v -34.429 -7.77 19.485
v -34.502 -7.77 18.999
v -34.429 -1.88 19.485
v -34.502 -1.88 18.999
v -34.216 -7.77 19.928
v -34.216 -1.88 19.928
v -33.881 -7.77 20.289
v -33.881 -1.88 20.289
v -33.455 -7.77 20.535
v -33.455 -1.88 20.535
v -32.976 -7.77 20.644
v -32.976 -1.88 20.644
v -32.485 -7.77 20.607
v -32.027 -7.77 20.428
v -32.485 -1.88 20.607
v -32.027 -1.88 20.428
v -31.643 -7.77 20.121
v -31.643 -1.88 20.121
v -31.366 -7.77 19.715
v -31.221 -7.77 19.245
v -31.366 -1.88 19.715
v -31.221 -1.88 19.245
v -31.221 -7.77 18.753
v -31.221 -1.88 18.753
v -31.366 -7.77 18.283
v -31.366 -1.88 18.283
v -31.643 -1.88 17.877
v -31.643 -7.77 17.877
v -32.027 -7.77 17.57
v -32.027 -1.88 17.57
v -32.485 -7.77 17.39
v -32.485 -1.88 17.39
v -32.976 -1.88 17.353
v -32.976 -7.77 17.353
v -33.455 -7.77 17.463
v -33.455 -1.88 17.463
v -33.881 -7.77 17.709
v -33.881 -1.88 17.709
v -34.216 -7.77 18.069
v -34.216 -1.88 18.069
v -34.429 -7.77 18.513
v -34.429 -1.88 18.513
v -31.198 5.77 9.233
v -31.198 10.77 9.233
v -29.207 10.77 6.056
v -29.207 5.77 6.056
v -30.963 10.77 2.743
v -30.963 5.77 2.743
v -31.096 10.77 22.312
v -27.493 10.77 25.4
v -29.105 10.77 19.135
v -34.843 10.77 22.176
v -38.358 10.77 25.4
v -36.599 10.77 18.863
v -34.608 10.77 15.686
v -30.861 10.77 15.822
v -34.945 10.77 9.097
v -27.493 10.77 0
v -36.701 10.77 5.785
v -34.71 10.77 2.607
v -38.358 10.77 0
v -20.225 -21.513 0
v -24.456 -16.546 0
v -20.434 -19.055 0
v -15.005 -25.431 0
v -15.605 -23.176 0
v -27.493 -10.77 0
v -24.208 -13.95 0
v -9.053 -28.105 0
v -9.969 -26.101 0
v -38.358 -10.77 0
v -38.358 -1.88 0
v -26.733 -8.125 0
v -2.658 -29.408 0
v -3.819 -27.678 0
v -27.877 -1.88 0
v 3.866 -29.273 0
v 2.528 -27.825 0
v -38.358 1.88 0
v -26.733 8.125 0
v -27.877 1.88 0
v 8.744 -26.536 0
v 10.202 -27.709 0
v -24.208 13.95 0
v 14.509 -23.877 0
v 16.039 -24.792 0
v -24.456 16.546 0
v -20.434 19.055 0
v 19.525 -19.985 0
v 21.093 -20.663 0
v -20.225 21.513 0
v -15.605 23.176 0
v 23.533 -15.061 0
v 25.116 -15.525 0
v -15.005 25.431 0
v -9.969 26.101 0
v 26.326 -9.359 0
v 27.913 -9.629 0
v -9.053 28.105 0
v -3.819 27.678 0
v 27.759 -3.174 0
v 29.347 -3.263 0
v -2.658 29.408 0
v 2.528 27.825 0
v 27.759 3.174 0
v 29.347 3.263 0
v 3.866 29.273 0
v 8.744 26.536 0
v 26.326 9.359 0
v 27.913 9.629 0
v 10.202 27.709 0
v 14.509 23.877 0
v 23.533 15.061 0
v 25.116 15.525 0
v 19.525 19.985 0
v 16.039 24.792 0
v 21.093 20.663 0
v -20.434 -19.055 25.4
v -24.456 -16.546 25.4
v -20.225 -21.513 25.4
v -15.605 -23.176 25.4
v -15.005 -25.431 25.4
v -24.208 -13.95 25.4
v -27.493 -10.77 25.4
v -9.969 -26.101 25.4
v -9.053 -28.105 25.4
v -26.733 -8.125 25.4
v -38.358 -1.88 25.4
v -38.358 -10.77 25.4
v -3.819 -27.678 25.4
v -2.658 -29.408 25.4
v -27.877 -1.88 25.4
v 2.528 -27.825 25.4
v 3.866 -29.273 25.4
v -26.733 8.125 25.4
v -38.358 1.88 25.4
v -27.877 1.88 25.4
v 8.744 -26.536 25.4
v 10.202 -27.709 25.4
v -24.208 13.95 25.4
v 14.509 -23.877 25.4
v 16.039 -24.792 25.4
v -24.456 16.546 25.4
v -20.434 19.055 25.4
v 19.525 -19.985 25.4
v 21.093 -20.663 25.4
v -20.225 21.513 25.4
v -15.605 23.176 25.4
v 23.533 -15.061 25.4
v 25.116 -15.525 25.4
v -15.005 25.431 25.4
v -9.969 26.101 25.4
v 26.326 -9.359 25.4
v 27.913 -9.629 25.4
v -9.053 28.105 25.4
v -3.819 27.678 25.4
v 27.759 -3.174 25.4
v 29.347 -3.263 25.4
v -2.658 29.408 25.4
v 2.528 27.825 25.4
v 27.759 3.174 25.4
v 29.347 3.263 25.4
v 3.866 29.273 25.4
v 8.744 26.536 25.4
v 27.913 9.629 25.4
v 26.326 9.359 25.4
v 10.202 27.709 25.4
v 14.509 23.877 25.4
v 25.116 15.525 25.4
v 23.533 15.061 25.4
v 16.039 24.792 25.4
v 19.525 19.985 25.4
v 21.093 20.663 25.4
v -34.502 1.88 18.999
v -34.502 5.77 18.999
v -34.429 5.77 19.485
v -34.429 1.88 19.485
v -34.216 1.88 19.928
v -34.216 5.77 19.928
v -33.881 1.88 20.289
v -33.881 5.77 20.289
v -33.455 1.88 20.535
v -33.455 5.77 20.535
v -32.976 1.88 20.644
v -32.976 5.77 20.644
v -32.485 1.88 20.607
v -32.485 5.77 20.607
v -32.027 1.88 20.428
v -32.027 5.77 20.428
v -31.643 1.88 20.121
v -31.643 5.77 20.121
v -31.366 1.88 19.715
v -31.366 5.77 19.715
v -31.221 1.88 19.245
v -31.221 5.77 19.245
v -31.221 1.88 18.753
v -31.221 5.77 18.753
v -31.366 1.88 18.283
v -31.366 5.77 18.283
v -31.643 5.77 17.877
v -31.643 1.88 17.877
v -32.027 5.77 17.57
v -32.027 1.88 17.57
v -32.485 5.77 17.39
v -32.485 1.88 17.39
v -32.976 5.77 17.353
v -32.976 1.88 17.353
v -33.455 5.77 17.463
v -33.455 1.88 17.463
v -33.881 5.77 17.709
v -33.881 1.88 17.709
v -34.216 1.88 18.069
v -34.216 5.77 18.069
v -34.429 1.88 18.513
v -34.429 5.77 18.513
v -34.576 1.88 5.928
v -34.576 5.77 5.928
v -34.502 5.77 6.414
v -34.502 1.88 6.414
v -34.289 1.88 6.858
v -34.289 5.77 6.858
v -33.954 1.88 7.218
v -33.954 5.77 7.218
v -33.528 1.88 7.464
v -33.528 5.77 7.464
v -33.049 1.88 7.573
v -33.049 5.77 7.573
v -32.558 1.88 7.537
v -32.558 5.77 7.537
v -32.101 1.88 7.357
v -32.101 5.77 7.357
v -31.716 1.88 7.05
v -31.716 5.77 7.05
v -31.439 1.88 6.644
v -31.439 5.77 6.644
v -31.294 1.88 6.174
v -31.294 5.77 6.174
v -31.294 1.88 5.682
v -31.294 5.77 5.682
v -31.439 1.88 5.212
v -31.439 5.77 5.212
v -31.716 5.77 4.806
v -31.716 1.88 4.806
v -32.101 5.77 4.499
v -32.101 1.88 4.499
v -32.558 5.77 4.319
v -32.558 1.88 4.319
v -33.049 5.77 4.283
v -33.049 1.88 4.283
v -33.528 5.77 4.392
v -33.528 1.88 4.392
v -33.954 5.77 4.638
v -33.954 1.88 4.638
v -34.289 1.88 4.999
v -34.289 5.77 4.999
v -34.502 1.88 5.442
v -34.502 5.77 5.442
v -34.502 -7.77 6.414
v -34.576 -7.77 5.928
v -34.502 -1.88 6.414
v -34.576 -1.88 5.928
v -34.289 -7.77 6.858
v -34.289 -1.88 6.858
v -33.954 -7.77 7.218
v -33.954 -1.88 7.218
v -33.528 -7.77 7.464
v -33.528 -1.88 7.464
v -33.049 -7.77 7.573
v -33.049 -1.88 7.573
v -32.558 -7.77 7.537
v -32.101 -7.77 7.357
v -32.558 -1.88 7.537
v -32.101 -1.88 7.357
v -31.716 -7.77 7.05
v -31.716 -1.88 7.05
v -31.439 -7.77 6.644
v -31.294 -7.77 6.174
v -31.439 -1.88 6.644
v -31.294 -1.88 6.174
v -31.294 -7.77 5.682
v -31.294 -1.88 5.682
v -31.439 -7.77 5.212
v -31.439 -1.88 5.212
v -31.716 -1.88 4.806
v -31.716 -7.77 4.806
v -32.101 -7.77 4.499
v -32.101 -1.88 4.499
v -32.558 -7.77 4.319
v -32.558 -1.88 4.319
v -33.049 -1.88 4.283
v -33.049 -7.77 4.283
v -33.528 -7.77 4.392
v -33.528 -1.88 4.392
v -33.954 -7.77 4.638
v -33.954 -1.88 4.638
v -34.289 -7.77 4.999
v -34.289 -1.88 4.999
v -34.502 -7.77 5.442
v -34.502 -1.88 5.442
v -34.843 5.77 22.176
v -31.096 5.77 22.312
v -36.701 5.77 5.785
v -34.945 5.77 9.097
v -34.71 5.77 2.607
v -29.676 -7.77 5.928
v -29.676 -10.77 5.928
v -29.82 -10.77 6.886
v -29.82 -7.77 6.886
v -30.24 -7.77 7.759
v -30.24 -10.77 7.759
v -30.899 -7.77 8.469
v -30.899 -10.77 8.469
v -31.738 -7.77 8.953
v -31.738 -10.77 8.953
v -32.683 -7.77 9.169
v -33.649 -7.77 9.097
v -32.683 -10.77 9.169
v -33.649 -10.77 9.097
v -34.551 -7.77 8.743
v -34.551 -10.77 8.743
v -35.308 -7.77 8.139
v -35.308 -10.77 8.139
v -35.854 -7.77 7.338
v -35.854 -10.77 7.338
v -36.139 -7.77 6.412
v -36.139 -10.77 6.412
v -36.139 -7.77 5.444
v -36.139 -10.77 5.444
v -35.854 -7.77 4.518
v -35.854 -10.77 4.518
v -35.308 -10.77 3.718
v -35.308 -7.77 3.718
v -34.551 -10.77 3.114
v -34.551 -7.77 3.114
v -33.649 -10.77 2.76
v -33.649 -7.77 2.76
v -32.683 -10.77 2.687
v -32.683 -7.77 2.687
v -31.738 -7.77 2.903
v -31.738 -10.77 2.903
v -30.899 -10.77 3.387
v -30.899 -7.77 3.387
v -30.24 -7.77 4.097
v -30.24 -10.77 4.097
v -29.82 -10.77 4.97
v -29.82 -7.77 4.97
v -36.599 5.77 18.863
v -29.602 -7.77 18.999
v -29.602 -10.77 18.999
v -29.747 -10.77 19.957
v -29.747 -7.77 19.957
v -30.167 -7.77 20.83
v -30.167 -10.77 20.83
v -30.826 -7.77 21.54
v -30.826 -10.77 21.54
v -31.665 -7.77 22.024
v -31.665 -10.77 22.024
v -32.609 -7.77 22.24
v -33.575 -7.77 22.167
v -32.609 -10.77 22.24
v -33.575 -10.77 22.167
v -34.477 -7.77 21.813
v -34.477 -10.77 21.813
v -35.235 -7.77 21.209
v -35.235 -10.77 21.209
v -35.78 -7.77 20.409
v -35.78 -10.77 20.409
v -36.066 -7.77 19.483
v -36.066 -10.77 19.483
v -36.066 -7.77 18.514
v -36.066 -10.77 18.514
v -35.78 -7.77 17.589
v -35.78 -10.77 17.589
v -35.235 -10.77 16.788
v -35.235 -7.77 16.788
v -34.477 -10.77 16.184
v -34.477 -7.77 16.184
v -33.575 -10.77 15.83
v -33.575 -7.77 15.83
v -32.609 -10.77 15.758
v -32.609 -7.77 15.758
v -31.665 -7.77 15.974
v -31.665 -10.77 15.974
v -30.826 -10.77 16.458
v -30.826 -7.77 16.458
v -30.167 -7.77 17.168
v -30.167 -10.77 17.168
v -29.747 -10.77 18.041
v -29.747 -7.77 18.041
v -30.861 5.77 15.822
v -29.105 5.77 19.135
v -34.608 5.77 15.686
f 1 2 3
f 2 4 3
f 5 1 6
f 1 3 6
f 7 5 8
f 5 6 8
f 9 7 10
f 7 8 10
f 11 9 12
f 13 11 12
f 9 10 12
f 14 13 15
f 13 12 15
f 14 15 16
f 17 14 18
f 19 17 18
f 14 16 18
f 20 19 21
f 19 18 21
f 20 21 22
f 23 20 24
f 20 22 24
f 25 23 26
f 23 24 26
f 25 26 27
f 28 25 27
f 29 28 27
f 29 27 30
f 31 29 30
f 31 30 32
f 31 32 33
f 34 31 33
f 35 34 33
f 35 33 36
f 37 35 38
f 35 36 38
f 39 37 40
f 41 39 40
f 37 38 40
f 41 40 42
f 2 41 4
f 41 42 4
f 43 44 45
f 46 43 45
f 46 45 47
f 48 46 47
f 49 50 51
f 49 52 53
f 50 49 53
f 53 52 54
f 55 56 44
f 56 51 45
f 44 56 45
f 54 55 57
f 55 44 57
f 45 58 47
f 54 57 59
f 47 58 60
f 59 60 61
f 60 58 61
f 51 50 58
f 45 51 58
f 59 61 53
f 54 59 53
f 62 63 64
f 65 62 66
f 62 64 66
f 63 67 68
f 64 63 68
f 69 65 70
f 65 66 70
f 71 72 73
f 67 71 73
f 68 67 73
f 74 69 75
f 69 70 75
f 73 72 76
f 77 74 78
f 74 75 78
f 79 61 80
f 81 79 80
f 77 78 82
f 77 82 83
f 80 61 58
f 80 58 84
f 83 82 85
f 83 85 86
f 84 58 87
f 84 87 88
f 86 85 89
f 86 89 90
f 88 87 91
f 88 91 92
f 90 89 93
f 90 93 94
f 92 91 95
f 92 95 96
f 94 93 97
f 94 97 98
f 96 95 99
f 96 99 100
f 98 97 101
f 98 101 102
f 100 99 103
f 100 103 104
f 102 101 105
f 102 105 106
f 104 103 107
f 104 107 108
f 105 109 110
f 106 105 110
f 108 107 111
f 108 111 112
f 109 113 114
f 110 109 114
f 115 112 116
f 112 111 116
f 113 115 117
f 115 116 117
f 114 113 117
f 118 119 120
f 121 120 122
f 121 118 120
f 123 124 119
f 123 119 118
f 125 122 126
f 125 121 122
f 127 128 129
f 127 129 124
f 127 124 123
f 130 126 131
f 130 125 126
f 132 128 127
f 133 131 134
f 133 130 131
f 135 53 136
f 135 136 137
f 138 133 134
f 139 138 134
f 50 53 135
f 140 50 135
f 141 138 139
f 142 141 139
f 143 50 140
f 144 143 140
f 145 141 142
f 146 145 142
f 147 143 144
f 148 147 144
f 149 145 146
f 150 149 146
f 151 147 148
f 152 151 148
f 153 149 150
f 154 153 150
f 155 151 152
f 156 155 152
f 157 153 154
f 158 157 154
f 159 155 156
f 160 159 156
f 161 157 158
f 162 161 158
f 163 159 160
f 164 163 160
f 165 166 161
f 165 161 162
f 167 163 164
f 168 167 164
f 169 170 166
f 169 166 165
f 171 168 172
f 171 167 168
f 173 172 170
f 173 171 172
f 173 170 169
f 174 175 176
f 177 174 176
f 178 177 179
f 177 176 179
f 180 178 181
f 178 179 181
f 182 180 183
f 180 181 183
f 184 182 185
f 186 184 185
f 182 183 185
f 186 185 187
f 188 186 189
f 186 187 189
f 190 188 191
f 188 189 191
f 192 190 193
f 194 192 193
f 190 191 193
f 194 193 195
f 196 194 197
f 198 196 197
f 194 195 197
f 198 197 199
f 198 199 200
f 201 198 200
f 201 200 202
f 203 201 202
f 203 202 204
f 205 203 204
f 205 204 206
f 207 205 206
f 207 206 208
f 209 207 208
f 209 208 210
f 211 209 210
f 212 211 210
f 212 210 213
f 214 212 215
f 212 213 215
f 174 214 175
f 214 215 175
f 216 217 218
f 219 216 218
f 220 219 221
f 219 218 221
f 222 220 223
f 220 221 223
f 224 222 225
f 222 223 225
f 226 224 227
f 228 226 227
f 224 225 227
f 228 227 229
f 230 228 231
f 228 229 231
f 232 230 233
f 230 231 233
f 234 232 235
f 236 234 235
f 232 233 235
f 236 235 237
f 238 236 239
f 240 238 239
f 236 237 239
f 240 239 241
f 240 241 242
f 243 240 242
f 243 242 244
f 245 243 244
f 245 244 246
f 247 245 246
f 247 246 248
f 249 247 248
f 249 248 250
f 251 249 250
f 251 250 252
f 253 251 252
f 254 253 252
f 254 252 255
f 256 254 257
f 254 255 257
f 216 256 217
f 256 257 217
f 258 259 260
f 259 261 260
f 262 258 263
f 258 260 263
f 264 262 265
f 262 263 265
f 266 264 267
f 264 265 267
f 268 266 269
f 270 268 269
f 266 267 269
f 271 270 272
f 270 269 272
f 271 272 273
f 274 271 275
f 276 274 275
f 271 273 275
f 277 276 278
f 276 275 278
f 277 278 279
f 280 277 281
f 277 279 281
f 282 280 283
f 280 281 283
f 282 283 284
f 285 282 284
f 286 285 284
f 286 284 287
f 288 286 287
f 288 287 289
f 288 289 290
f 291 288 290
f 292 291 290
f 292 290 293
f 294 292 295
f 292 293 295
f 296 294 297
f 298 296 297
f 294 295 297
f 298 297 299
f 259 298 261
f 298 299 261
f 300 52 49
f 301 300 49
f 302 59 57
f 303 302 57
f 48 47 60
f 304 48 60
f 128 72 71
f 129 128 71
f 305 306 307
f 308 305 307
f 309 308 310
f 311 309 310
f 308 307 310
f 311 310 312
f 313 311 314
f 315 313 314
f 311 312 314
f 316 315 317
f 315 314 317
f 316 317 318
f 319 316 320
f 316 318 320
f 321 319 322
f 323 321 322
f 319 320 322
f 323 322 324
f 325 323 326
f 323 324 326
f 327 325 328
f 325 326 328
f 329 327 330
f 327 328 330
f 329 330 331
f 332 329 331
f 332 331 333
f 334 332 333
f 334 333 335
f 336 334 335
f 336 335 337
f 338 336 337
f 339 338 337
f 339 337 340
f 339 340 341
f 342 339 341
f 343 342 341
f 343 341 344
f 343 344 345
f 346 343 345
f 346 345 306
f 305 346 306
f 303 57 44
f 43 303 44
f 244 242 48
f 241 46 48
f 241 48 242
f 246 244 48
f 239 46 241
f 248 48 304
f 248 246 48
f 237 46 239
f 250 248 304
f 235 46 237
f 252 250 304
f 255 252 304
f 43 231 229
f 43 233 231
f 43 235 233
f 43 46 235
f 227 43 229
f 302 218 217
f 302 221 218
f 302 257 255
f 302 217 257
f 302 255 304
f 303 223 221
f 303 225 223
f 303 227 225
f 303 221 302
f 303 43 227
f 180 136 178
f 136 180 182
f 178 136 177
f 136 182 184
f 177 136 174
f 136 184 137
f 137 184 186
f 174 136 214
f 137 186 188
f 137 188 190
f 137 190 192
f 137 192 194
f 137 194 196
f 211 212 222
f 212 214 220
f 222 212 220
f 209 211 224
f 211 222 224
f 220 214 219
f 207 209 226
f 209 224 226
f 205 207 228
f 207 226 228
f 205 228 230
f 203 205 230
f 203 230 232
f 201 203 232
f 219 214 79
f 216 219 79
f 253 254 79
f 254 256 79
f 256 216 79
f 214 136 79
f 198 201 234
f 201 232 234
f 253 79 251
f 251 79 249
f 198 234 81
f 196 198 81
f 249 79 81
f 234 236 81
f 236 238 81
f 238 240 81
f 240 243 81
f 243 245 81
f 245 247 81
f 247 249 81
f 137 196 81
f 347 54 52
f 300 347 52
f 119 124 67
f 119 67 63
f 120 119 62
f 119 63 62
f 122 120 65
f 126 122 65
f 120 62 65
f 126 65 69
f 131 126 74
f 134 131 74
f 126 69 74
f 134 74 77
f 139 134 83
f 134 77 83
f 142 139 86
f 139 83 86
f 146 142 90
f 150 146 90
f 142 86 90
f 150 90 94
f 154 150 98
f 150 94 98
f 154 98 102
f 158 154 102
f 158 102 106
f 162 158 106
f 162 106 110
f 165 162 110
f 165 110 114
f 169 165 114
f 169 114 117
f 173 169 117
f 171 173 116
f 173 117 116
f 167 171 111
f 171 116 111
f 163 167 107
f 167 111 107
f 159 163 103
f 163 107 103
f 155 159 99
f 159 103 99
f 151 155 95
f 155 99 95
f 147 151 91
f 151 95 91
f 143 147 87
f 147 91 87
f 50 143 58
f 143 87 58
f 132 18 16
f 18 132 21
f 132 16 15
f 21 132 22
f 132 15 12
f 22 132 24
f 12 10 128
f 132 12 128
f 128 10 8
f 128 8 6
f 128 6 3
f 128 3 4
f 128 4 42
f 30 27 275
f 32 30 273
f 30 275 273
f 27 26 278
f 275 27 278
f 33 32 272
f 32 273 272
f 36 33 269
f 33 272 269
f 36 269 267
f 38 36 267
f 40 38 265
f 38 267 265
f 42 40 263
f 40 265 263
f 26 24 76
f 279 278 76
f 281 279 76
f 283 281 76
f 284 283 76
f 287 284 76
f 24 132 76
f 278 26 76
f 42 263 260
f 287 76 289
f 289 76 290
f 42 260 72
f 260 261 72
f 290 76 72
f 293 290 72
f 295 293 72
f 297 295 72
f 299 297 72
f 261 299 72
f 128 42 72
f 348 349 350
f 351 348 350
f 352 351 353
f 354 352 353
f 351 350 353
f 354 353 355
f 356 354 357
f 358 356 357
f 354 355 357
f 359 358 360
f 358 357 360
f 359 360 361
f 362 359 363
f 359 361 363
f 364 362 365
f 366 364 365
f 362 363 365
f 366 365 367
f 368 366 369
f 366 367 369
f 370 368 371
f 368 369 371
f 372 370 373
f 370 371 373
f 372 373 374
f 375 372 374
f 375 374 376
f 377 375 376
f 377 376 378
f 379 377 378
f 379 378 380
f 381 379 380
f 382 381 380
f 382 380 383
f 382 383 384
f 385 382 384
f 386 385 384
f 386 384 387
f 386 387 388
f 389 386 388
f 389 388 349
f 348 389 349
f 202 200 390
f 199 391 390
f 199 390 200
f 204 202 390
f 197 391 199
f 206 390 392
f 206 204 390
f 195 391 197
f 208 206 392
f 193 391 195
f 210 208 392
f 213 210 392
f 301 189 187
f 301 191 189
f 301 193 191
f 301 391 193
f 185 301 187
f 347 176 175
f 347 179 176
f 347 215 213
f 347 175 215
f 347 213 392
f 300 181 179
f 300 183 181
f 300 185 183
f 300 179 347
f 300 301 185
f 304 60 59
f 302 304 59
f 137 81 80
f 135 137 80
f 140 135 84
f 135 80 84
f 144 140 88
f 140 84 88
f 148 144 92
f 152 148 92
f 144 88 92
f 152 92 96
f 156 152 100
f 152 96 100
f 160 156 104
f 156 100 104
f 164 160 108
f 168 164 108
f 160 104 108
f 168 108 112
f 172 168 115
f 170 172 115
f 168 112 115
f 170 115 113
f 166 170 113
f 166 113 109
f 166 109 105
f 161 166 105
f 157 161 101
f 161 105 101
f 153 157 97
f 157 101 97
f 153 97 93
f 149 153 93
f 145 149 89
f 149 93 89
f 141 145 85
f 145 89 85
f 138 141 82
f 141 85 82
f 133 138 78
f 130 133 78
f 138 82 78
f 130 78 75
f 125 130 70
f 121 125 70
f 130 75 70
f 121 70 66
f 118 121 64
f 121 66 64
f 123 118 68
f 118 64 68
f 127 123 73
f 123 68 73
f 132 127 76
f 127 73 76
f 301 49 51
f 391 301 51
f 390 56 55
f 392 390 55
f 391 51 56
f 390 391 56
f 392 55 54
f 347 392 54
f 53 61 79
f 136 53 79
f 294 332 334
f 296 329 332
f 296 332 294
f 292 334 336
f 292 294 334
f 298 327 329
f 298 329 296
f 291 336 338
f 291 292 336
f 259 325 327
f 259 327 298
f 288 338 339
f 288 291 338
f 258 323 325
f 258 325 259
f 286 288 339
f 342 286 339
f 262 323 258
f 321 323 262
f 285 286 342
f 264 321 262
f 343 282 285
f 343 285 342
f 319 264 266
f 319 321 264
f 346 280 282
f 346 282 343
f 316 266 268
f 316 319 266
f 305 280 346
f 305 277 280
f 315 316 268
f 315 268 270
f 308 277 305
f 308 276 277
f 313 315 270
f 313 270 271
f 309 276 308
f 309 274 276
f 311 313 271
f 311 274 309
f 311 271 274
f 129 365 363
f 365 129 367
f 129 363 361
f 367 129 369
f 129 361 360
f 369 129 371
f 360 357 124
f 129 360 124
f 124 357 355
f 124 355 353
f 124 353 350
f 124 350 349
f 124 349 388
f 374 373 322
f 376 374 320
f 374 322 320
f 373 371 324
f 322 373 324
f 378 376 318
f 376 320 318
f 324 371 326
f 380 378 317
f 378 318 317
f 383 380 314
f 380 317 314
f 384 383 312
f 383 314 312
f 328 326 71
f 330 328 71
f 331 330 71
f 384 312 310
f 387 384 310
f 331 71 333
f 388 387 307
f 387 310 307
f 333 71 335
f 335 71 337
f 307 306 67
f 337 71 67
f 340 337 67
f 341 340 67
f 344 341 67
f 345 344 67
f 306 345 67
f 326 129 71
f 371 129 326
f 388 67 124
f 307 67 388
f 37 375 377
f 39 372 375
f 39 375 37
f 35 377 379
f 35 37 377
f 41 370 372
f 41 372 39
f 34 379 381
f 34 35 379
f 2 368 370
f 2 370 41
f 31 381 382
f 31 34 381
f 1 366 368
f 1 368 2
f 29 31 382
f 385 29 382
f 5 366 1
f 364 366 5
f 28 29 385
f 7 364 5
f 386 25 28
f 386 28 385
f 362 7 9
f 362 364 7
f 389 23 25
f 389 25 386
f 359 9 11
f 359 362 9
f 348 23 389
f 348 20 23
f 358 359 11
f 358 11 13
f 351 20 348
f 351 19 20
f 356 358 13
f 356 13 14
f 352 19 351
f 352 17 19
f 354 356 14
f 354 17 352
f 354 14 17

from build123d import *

# Parameters (mm, degrees)
F1_DEPTH       = 25.4
F3_D           = 3.3
F3_CBORE_D     = 6.5
F3_CBORE_DEPTH = 3
F5_DEPTH       = 5


with BuildPart() as f1:
    # F0 (on Top) → F1 (new body)
    with BuildSketch(Plane.XY):
        with BuildLine():
            ThreePointArc((-27.8767053979, 1.8796), (27.94, 0), (-27.8767053979, -1.8796))
            Line((-27.8767053979, -1.8796), (-29.4676154463, -1.8796))
            Line((-29.4676154463, -1.8796), (-38.3576154463, -1.8796))
            Line((-38.3576154463, -1.8796), (-38.3576154463, -10.7696))
            Line((-38.3576154463, -10.7696), (-29.4676154463, -10.7696))
            Line((-29.4676154463, -10.7696), (-27.4934350726, -10.7696))
            ThreePointArc((-27.4934350726, -10.7696), (29.5275, 0), (-27.4934350726, 10.7696))
            Line((-27.4934350726, 10.7696), (-29.4676154463, 10.7696))
            Line((-29.4676154463, 10.7696), (-38.3576154463, 10.7696))
            Line((-38.3576154463, 10.7696), (-38.3576154463, 1.8796))
            Line((-38.3576154463, 1.8796), (-29.4676154463, 1.8796))
            Line((-29.4676154463, 1.8796), (-27.8767053979, 1.8796))
        make_face()
    extrude(amount=F1_DEPTH)

    # F3 (through all)
    with Locations(Plane.XZ.offset(10.7696)):
        with Locations((-32.8522585332, 18.9988464117), (-32.9255252594, 5.9281084687)):
            CounterBoreHole(F3_D / 2, F3_CBORE_D / 2, F3_CBORE_DEPTH)

    # F4 (on face) → F5 (cut)
    with BuildSketch(Plane(origin=(0, 10.7696, 0), x_dir=(-1, 0, 0), z_dir=(0, 1, 0))):
        Polygon((34.6081861546, 15.6860156038), (36.599217982, 18.8631089351), (34.8432903606, 22.175939743), (31.0963309118, 22.3116772196), (29.1052990845, 19.1345838883), (30.8612267059, 15.8217530804), align=None)
        Polygon((36.7005912762, 5.7845558547), (34.9446636548, 9.0973866626), (31.197704206, 9.2331241392), (29.2066723786, 6.0560308079), (30.9626, 2.7432), (34.7095594488, 2.6074625234), align=None)
    extrude(amount=-F5_DEPTH, mode=Mode.SUBTRACT)


solid = f1.part
